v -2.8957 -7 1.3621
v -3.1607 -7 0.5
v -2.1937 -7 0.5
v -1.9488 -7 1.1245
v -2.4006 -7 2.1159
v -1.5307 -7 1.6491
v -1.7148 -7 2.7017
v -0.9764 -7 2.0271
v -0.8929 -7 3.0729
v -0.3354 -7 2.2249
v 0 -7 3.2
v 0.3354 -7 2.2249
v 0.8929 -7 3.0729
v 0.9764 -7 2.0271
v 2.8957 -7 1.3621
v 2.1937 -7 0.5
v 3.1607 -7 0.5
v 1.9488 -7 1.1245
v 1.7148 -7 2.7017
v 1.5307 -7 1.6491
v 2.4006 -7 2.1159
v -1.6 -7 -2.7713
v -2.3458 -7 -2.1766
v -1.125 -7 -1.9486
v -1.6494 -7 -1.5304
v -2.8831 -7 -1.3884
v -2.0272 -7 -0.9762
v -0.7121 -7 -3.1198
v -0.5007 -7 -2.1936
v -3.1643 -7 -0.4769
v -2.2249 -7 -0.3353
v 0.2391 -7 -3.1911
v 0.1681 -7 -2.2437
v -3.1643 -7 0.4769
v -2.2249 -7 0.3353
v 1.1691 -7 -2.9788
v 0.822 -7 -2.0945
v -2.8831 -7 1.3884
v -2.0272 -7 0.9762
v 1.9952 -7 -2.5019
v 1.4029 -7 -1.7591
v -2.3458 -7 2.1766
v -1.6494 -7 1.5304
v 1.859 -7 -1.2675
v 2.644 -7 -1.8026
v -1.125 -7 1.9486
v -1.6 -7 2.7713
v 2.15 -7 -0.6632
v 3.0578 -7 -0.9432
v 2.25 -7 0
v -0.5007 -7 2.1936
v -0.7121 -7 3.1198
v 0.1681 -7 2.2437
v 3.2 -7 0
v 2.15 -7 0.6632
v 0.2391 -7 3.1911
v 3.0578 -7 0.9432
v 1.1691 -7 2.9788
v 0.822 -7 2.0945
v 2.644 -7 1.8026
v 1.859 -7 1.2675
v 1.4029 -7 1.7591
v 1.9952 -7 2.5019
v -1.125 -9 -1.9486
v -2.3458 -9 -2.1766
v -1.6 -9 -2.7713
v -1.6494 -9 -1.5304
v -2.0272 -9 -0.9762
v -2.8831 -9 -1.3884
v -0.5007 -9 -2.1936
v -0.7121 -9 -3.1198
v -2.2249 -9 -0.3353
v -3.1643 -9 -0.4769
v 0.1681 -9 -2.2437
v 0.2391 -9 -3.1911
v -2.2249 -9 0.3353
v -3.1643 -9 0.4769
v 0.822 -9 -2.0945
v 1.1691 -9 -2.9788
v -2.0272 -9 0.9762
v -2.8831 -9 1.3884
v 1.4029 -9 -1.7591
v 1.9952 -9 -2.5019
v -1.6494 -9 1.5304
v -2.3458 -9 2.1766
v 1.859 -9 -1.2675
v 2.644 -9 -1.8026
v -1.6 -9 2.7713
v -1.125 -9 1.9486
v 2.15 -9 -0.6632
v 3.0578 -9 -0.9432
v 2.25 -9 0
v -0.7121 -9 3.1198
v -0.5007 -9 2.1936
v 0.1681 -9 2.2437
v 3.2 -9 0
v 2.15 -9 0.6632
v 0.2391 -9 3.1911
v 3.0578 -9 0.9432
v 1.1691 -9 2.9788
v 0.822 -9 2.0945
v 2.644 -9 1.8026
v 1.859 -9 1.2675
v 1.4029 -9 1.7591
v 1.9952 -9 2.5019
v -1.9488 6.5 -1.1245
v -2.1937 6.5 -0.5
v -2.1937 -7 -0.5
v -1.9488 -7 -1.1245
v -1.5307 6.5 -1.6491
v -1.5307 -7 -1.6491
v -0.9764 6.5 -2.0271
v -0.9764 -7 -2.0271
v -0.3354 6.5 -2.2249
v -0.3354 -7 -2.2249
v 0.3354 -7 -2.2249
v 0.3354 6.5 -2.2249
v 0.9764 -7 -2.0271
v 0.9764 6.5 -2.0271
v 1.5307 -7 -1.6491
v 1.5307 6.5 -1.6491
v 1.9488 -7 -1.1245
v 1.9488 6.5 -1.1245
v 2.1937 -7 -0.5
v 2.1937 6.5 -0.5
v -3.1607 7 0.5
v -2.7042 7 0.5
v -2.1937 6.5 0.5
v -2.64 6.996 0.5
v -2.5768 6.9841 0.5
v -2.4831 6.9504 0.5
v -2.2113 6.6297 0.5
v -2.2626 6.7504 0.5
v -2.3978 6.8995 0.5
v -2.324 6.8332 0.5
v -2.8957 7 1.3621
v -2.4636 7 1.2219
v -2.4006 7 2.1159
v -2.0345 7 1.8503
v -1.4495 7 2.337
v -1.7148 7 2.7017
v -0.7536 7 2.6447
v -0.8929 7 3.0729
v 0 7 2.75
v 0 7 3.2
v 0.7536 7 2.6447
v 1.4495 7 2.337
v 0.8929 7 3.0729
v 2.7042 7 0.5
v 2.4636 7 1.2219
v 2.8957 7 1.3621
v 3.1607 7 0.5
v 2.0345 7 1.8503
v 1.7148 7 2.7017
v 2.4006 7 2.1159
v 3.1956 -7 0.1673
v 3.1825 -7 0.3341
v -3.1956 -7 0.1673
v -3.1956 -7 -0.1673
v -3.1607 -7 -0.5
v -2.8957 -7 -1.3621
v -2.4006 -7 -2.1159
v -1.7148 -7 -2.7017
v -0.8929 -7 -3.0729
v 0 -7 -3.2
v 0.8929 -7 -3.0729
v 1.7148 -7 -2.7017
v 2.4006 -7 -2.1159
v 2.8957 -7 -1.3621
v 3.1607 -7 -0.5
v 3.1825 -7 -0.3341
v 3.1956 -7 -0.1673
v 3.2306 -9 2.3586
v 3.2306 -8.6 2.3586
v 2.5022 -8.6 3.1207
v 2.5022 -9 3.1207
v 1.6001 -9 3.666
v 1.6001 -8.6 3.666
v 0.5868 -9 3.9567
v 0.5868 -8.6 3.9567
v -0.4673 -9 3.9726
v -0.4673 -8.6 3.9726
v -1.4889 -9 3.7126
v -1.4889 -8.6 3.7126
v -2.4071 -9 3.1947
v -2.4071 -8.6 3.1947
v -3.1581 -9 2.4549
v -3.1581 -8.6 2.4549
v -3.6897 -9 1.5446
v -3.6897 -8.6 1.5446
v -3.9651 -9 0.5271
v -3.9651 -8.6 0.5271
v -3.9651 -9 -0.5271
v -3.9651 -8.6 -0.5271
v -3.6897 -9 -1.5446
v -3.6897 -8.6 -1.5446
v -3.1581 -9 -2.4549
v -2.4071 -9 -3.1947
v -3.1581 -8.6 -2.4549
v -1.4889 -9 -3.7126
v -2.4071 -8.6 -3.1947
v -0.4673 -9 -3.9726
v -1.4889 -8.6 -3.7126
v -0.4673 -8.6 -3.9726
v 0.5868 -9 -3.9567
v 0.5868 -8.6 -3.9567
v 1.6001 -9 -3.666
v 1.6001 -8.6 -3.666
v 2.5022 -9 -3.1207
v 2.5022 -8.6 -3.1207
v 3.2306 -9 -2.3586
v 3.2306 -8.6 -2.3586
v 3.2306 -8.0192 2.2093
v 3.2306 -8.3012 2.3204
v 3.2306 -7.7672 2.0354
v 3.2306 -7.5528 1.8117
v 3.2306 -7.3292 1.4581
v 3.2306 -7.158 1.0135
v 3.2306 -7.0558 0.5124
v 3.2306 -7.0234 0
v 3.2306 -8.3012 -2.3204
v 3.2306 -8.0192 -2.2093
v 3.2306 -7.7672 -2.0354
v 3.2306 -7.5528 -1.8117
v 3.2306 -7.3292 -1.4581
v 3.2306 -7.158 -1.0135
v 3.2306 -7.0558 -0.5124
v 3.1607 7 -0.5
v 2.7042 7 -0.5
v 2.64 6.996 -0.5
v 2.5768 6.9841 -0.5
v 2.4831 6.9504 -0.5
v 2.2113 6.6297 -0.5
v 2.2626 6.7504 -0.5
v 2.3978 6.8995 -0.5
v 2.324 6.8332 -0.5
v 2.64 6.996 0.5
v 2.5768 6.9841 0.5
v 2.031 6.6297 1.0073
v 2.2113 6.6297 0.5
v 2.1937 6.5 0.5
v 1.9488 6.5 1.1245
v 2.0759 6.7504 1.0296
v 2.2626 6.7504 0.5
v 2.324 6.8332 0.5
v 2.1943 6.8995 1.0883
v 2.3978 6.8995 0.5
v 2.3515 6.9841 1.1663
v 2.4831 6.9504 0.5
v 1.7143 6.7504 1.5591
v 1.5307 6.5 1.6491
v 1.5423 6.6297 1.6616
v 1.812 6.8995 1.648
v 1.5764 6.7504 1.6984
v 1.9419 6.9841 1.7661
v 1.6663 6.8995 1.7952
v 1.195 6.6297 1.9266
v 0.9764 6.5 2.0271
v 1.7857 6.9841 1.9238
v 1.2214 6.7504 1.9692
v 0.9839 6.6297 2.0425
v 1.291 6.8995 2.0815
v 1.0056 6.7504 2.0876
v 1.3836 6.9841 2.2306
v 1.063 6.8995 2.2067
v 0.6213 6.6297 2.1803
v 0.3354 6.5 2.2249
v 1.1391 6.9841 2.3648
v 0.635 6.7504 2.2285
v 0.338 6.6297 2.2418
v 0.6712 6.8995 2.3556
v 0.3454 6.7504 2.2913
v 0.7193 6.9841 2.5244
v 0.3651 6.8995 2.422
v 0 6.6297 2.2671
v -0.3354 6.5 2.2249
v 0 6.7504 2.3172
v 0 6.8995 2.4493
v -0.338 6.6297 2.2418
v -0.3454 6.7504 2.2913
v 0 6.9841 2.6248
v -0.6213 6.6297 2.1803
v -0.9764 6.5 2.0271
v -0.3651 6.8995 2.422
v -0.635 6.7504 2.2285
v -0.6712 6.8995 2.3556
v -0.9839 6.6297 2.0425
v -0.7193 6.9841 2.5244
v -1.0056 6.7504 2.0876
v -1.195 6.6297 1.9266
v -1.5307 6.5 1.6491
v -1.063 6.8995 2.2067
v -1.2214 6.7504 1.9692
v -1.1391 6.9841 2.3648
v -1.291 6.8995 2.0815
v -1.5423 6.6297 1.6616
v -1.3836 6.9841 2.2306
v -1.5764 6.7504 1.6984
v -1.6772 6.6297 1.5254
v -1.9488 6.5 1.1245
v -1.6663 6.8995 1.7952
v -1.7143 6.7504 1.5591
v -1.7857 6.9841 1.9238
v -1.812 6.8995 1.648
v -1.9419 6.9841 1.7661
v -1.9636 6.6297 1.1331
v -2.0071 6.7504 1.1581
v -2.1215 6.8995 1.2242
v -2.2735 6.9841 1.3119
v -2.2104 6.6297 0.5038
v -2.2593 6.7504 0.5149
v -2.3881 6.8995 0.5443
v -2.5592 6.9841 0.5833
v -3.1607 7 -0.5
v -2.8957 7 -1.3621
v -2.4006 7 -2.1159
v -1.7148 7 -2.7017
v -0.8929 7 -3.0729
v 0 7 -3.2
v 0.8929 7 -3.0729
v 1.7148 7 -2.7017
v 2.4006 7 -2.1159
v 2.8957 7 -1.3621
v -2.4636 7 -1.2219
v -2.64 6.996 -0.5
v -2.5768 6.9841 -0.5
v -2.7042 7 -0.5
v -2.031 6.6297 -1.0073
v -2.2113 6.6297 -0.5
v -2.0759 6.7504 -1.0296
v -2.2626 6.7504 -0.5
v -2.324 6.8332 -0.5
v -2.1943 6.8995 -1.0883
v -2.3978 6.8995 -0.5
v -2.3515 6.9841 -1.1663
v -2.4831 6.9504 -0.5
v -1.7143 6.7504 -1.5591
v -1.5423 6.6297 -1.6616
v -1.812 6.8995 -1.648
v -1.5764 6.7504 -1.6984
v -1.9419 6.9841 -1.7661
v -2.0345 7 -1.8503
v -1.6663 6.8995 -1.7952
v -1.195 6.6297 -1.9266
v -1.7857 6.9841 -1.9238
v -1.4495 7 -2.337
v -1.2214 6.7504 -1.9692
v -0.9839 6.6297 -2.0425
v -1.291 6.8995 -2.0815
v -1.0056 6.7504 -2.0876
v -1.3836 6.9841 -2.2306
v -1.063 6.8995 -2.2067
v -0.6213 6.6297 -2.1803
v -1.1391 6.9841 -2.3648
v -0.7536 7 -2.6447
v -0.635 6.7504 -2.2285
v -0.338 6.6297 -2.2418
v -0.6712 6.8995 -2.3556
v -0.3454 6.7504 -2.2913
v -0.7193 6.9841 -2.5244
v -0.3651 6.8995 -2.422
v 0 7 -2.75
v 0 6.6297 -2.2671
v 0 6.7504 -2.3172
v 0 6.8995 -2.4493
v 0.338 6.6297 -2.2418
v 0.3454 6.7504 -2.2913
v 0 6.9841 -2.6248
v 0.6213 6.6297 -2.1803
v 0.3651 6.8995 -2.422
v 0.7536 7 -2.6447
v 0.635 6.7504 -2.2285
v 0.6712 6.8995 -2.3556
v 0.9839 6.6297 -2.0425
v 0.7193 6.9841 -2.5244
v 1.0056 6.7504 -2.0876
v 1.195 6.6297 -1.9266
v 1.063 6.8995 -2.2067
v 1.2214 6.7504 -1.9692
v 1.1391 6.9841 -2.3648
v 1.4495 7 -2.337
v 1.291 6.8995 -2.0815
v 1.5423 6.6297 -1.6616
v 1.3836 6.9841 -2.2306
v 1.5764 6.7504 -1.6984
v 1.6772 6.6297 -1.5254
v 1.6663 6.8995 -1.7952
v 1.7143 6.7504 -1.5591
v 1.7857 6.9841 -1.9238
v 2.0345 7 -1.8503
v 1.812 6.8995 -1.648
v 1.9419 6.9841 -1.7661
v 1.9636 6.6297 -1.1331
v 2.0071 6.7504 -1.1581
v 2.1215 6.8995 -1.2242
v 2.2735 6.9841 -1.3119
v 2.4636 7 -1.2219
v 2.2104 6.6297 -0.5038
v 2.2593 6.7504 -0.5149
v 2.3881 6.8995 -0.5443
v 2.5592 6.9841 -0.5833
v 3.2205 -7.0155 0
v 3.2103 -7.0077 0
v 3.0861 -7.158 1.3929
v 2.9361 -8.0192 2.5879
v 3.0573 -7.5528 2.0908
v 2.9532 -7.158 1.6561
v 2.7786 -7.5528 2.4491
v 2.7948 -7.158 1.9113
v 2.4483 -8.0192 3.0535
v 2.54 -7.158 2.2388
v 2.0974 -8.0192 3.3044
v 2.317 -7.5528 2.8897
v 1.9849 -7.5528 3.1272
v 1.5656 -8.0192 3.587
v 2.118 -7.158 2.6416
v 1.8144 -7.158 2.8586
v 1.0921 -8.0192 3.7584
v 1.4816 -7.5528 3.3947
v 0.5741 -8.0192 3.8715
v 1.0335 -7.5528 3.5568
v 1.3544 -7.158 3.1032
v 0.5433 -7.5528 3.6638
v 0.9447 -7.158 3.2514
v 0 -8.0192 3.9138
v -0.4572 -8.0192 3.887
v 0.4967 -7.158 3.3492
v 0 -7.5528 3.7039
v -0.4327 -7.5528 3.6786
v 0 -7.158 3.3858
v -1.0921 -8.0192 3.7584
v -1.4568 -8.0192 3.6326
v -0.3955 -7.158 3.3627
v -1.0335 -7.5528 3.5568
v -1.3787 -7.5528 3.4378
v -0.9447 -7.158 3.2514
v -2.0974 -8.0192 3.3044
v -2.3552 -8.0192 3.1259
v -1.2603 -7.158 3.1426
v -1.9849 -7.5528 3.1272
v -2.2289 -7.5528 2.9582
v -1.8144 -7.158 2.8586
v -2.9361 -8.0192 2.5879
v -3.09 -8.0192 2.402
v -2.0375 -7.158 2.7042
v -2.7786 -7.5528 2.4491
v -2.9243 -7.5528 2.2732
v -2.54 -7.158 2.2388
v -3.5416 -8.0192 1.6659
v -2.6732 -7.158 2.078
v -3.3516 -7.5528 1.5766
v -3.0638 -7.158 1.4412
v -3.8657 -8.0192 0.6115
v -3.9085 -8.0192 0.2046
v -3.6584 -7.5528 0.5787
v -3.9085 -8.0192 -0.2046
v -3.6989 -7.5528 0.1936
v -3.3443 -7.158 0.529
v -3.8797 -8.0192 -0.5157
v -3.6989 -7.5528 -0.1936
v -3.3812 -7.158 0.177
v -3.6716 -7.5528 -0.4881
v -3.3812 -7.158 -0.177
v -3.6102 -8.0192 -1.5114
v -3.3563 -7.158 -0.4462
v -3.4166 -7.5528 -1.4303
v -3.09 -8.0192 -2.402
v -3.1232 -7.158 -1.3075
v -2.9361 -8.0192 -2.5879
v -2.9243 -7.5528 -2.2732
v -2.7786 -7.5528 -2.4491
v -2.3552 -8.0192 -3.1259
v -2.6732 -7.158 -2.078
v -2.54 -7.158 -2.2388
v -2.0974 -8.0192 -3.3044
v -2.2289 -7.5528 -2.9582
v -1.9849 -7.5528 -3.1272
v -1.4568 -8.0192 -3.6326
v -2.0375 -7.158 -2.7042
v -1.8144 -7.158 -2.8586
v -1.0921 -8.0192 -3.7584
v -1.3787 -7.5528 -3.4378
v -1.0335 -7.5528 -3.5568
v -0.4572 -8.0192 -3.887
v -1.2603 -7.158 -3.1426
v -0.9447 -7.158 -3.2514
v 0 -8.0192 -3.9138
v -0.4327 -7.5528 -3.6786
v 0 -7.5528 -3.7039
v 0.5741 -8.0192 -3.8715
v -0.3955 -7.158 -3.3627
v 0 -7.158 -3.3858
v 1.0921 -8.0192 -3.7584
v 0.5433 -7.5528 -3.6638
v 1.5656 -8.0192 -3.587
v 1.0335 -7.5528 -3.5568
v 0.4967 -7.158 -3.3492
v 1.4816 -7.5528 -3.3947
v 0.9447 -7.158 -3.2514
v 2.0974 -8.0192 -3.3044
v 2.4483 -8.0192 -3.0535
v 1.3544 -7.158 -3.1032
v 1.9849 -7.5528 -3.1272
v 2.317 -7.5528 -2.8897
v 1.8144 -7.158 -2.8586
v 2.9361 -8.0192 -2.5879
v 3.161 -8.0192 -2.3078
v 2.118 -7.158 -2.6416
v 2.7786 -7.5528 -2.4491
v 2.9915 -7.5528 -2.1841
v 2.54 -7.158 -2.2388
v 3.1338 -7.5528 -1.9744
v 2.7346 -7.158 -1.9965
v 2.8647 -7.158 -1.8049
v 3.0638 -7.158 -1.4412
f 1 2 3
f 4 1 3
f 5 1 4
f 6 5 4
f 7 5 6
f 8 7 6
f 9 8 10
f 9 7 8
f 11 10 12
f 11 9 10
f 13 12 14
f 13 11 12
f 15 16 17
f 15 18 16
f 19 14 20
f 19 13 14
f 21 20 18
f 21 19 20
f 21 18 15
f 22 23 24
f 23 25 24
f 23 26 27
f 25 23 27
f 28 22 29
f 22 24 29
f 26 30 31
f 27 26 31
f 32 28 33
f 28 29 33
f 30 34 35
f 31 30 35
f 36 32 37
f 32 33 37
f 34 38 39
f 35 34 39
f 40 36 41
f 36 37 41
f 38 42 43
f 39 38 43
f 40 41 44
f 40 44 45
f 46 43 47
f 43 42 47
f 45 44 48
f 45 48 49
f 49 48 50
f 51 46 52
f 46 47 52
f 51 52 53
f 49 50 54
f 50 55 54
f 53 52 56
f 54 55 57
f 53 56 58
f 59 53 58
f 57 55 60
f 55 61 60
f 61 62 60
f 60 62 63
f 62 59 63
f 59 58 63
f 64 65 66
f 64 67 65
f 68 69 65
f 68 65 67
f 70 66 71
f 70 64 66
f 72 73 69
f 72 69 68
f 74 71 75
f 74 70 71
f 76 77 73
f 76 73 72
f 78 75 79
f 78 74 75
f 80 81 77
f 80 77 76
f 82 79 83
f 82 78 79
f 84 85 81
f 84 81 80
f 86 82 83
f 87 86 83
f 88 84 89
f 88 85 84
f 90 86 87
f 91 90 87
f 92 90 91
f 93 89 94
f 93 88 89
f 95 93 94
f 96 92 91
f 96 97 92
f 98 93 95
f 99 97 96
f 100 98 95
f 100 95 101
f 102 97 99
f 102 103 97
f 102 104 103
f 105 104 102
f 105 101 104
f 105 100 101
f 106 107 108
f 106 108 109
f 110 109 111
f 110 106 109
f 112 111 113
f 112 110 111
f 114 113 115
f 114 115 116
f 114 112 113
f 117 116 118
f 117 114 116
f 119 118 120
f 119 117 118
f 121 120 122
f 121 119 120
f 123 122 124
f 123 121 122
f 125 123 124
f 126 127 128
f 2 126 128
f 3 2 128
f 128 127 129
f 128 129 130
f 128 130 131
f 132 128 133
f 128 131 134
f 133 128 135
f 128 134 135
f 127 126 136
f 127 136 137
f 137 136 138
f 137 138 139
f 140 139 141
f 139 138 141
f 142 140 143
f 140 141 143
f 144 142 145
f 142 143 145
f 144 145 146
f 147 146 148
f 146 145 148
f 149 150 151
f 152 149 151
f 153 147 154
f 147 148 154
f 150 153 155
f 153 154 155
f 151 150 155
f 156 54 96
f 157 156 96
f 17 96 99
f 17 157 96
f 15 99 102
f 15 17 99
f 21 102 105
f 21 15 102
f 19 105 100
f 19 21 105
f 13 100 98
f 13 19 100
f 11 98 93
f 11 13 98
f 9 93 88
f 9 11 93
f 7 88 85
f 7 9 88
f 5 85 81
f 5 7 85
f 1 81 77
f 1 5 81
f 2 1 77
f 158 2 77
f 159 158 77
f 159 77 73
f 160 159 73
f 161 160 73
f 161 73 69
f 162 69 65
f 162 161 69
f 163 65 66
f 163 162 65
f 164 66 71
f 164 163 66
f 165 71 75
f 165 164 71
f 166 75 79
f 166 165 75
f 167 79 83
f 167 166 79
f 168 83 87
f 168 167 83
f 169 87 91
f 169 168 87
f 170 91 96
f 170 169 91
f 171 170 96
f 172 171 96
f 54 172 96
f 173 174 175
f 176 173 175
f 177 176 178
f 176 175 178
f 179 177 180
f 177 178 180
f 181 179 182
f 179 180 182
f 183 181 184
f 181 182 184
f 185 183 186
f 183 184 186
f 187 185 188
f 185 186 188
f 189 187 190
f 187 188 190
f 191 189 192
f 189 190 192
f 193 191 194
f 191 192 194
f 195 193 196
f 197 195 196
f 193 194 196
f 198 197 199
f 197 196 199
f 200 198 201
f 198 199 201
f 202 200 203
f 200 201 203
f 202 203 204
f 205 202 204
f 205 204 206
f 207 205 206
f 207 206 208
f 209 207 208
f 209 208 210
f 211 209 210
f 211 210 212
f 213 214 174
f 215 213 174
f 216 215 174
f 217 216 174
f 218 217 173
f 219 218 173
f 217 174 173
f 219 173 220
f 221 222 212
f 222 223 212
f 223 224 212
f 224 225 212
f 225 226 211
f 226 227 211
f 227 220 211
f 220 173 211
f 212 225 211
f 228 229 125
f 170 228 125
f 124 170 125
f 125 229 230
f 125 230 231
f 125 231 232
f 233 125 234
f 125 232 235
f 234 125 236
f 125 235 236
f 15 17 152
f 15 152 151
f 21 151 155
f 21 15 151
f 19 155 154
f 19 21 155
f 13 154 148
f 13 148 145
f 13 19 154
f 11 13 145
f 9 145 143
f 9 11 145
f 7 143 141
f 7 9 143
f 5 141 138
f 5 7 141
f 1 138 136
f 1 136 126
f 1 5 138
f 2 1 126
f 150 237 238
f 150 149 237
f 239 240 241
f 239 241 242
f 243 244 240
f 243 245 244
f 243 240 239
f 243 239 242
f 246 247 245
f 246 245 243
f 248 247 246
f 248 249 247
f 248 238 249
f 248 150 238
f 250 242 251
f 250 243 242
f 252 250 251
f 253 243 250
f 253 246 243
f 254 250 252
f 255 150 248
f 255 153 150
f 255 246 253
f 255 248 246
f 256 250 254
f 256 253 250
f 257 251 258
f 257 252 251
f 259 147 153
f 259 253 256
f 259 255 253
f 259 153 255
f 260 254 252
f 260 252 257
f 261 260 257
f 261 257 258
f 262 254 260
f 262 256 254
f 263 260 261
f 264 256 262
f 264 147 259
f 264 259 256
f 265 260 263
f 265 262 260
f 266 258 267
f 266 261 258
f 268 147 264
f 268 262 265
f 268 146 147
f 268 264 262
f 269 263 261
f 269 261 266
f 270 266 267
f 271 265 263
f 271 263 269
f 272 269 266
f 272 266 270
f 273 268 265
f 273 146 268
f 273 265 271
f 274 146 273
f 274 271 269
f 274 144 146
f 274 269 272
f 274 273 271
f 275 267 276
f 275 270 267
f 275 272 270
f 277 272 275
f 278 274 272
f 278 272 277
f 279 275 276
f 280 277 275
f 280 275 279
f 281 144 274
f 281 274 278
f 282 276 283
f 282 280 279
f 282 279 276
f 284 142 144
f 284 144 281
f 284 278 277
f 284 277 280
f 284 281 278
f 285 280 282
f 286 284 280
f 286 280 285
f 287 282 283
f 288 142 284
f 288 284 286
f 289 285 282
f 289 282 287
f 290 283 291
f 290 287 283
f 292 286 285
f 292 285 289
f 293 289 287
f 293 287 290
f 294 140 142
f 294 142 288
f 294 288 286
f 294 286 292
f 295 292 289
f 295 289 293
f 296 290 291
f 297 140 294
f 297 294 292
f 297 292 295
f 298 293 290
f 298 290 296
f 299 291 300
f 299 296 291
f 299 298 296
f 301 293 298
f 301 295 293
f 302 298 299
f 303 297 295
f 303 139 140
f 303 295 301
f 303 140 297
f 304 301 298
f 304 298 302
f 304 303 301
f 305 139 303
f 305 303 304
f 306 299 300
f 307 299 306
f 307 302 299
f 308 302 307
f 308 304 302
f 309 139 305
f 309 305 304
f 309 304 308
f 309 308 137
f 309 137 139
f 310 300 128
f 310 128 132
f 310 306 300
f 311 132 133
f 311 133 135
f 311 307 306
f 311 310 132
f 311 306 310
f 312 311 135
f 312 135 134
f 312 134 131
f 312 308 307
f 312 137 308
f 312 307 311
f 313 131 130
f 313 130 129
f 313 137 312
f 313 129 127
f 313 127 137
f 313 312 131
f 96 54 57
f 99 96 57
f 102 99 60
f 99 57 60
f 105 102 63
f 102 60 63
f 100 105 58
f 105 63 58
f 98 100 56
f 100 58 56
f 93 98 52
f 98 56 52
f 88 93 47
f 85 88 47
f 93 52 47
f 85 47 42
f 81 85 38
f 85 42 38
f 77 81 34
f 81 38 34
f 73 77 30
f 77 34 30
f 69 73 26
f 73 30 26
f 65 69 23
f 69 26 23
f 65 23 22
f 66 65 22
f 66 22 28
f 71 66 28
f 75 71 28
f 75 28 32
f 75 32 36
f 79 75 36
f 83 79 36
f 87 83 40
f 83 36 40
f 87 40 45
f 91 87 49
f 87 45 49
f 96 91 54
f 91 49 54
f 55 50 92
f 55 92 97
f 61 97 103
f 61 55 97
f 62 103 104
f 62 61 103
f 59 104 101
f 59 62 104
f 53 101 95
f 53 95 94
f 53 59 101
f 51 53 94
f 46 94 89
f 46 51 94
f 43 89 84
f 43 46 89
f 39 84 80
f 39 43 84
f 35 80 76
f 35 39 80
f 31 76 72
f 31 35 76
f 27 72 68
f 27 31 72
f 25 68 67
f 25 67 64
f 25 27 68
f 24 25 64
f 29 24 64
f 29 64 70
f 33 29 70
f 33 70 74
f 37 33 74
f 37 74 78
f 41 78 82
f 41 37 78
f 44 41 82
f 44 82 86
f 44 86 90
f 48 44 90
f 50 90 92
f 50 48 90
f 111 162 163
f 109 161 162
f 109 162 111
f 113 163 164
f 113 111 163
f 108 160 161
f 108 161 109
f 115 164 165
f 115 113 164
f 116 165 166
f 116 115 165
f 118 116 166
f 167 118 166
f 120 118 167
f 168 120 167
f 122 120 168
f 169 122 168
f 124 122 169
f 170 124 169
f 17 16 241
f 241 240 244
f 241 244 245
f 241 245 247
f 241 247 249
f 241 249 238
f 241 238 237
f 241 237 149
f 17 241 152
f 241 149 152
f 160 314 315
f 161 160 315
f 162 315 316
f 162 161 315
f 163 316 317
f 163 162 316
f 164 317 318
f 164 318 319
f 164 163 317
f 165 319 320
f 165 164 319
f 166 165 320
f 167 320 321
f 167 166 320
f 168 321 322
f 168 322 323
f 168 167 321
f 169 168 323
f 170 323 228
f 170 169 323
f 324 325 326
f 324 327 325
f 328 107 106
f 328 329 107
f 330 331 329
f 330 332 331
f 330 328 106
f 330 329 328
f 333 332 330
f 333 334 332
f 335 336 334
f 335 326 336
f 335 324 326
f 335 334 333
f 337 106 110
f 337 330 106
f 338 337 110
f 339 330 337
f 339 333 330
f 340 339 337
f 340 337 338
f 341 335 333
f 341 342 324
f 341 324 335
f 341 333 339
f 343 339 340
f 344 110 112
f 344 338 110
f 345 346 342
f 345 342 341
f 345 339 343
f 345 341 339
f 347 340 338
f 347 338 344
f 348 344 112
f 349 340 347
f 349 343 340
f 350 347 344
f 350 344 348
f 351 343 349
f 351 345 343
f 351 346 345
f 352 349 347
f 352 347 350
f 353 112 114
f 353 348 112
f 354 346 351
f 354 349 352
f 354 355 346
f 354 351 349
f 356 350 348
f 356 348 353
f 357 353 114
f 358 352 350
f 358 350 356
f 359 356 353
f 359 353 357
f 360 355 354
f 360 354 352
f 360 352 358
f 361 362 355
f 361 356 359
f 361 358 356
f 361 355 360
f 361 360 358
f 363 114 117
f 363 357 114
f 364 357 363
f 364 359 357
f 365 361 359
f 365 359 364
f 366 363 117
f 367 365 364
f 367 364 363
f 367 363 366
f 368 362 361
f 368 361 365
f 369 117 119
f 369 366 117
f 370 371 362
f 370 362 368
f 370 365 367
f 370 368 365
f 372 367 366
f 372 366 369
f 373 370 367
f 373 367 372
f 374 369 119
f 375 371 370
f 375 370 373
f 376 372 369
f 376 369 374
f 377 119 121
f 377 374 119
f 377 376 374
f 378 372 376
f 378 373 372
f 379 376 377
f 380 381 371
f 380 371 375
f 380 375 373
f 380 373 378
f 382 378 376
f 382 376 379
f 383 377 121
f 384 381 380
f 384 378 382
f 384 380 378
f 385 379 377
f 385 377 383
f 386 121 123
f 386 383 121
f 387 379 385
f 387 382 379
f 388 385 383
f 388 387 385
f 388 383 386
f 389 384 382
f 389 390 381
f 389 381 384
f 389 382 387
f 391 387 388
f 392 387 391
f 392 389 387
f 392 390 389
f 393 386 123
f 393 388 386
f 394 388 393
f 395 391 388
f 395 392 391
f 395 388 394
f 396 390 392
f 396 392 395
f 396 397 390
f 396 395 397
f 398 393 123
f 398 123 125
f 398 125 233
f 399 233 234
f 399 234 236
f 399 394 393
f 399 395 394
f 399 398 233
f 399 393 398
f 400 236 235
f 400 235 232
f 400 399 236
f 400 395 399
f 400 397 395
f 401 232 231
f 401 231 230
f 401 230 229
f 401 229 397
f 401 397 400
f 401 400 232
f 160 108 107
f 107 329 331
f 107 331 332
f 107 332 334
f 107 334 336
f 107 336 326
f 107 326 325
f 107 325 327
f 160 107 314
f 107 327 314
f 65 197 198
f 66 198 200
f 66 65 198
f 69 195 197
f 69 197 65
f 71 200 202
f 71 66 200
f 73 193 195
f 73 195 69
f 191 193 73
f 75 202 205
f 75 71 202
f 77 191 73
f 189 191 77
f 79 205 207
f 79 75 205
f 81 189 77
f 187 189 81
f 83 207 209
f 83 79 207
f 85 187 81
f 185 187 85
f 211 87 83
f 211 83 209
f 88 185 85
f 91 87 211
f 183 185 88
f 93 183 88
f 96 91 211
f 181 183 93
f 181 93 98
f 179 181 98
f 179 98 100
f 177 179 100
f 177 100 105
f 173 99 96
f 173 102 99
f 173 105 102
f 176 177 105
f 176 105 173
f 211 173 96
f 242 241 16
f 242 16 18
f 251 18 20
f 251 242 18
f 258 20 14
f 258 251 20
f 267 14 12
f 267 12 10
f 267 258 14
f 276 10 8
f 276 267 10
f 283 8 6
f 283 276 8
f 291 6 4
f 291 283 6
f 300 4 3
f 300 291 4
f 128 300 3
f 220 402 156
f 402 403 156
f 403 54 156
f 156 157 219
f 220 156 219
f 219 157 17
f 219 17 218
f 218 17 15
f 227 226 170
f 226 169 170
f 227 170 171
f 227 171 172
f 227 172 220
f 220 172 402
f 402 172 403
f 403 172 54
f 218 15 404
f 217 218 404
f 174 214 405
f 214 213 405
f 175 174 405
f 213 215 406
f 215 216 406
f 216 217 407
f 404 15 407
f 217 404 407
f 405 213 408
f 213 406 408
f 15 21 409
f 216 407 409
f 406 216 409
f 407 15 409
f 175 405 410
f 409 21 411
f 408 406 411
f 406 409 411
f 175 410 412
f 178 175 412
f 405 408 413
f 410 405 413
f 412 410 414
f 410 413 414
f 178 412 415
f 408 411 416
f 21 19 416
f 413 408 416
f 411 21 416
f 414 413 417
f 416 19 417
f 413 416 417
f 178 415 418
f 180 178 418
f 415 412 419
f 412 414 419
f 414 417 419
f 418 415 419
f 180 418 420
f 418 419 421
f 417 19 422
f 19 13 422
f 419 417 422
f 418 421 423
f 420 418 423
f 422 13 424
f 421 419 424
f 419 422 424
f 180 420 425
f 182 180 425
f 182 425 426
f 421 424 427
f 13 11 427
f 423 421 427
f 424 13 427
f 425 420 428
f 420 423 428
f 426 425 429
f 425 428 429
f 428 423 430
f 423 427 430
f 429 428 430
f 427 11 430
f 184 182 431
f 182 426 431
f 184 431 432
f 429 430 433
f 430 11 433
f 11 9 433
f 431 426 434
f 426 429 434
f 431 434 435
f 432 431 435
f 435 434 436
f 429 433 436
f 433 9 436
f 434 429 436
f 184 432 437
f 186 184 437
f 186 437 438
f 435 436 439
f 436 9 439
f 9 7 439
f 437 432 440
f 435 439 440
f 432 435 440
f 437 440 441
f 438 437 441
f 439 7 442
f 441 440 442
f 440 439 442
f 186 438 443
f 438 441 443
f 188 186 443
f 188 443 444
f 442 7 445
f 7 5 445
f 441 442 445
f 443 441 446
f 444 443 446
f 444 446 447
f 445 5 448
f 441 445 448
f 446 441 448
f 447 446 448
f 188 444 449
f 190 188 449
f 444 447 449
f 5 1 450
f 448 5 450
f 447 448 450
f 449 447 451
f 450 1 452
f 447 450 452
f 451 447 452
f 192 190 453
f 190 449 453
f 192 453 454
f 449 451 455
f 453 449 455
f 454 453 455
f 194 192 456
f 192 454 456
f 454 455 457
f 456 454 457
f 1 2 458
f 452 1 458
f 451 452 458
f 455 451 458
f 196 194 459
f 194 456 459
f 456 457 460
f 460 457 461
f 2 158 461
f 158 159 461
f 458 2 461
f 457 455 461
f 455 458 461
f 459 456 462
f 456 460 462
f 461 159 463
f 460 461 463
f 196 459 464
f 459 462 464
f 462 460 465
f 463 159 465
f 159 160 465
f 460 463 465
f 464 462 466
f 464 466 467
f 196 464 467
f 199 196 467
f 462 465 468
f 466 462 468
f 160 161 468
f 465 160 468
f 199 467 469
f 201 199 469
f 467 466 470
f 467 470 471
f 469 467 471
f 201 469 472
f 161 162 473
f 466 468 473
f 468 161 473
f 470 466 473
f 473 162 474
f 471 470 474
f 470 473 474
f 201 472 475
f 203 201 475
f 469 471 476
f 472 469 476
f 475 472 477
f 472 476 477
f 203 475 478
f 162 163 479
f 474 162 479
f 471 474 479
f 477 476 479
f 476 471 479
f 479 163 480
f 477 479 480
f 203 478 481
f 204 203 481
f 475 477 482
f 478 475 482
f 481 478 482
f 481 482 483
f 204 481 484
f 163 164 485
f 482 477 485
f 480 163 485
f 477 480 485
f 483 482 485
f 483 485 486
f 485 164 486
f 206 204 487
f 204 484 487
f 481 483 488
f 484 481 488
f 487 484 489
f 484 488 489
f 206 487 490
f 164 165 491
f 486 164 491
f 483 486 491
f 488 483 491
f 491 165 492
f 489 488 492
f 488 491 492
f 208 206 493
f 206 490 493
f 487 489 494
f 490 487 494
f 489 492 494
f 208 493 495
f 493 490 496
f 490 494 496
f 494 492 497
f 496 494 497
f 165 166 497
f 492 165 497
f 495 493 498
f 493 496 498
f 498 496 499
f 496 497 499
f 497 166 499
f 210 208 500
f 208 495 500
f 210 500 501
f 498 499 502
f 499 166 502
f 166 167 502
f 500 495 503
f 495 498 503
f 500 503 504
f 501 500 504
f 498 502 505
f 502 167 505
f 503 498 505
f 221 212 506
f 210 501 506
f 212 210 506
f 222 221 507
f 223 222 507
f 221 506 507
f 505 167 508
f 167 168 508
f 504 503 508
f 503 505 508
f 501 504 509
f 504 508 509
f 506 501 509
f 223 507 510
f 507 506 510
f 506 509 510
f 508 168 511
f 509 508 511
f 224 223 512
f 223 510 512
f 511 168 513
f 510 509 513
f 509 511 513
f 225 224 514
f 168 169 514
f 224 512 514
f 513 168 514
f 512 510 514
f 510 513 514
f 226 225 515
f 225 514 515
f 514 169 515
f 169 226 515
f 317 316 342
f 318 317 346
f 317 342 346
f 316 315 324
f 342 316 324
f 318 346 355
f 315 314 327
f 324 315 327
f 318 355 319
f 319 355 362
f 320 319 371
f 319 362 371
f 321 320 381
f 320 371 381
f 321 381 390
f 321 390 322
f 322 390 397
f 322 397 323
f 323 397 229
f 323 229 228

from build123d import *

# Parameters (mm, degrees)
F0_R      = 3.2
F0_R_2    = 2.25
F1_DEPTH  = 7
F2_R      = 0.5
F3_R      = 4
F3_R_2    = 3.2
F4_DEPTH  = 2
F6_DEPTH  = 2
F8_DEPTH  = 14
F10_DEPTH = 25


# Not quite as in the source:
# - a fillet or chamfer that OpenCascade refuses, or shapes differently, is made with other operations: its cross-section is extruded or revolved along the edge and cut away or added


with BuildPart() as f1:
    # F0 (on Front) → F1 (new body, symmetric)
    with BuildSketch(Plane.XZ):
        Circle(F0_R)
        Circle(F0_R_2, mode=Mode.SUBTRACT)
    extrude(amount=F1_DEPTH, both=True)

    # F2
    f2_edges = [f1.edges().sort_by_distance(p)[0] for p in [
        (-2.25, 7, 0),
    ]]
    fillet(f2_edges, radius=F2_R)

    # F3 (on face) → F4 (join)
    with BuildSketch(Plane.XZ.offset(7)):
        Circle(F3_R)
        Circle(F3_R_2, mode=Mode.SUBTRACT)
    extrude(amount=F4_DEPTH)

    # F5: fillet of radius 2 on 1 edges, made by hand

    # F5_s1 → F5_t2 (revolve, cut)
    with BuildSketch(Plane.XY):
        with BuildLine():
            ThreePointArc((4, -8.6), (3.788854382, -7.705572809), (3.2, -7))
            Line((3.2, -7), (4, -7))
            Line((4, -7), (4, -8.6))
        make_face()
    revolve(axis=Axis((0, -7, 0), (0, -1, 0)), mode=Mode.SUBTRACT)


with BuildPart() as f6:
    # F6 (new): a face of the model
    f6_faces = [f1.part.faces().sort_by_distance(p)[0] for p in [
        (-3.109490332, -7, 0),
    ]]
    extrude(f6_faces, amount=F6_DEPTH)


with BuildPart() as f1_1:
    add(f1.part)

    # F7 (on face) → F8 (cut)
    with BuildSketch(Plane(origin=(0, 7, 0), x_dir=(-1, 0, 0), z_dir=(0, 1, 0))):
        with BuildLine():
            Line((3.6153841381, -0.5), (3.6153841381, 0.5))
            Line((3.6153841381, 0.5), (3.1606961259, 0.5))
            ThreePointArc((3.1606961259, 0.5), (3.1901588991, 0.2507712077), (3.2, 0))
            ThreePointArc((3.2, 0), (3.1901588991, -0.2507712077), (3.1606961259, -0.5))
            Line((3.1606961259, -0.5), (3.6153841381, -0.5))
        make_face()
        with BuildLine():
            ThreePointArc((3.2, 0), (3.1901588991, 0.2507712077), (3.1606961259, 0.5))
            Line((3.1606961259, 0.5), (2.7041634566, 0.5))
            ThreePointArc((2.7041634566, 0.5), (2.7385168893, 0.2510482965), (2.75, 0))
            ThreePointArc((2.75, 0), (2.7385168893, -0.2510482965), (2.7041634566, -0.5))
            Line((2.7041634566, -0.5), (3.1606961259, -0.5))
            ThreePointArc((3.1606961259, -0.5), (3.1901588991, -0.2507712077), (3.2, 0))
        make_face()
        with BuildLine():
            ThreePointArc((2.75, 0), (2.7385168893, 0.2510482965), (2.7041634566, 0.5))
            Line((2.7041634566, 0.5), (-2.7041634566, 0.5))
            ThreePointArc((-2.7041634566, 0.5), (-2.75, 0), (-2.7041634566, -0.5))
            Line((-2.7041634566, -0.5), (2.7041634566, -0.5))
            ThreePointArc((2.7041634566, -0.5), (2.7385168893, -0.2510482965), (2.75, 0))
        make_face()
        with BuildLine():
            ThreePointArc((-3.1606961259, -0.5), (-3.2, 0), (-3.1606961259, 0.5))
            Line((-3.1606961259, 0.5), (-3.6153841381, 0.5))
            Line((-3.6153841381, 0.5), (-3.6153841381, -0.5))
            Line((-3.6153841381, -0.5), (-3.1606961259, -0.5))
        make_face()
        with BuildLine():
            Line((-2.7041634566, 0.5), (-3.1606961259, 0.5))
            ThreePointArc((-3.1606961259, 0.5), (-3.2, 0), (-3.1606961259, -0.5))
            Line((-3.1606961259, -0.5), (-2.7041634566, -0.5))
            ThreePointArc((-2.7041634566, -0.5), (-2.75, 0), (-2.7041634566, 0.5))
        make_face()
    extrude(amount=-F8_DEPTH, mode=Mode.SUBTRACT)

    # F9 (on face) → F10 (cut)
    with BuildSketch(Plane.XZ.offset(9)):
        with BuildLine():
            Line((3.2306045759, -2.3586424218), (3.2306045759, -4.3381056748))
            Line((3.2306045759, -4.3381056748), (4.7693954241, -4.3381056748))
            Line((4.7693954241, -4.3381056748), (4.7693954241, 4.3381056748))
            Line((4.7693954241, 4.3381056748), (3.2306045759, 4.3381056748))
            Line((3.2306045759, 4.3381056748), (3.2306045759, 2.3586424218))
            ThreePointArc((3.2306045759, 2.3586424218), (3.8027896539, 1.2404800878), (4, 0))
            ThreePointArc((4, 0), (3.8027896539, -1.2404800878), (3.2306045759, -2.3586424218))
        make_face()
        with BuildLine():
            Line((3.2306045759, 2.3586424218), (3.2306045759, -2.3586424218))
            ThreePointArc((3.2306045759, -2.3586424218), (3.8027896539, -1.2404800878), (4, 0))
            ThreePointArc((4, 0), (3.8027896539, 1.2404800878), (3.2306045759, 2.3586424218))
        make_face()
    extrude(amount=-F10_DEPTH, mode=Mode.SUBTRACT)


solid = Compound([f6.part, f1_1.part])
